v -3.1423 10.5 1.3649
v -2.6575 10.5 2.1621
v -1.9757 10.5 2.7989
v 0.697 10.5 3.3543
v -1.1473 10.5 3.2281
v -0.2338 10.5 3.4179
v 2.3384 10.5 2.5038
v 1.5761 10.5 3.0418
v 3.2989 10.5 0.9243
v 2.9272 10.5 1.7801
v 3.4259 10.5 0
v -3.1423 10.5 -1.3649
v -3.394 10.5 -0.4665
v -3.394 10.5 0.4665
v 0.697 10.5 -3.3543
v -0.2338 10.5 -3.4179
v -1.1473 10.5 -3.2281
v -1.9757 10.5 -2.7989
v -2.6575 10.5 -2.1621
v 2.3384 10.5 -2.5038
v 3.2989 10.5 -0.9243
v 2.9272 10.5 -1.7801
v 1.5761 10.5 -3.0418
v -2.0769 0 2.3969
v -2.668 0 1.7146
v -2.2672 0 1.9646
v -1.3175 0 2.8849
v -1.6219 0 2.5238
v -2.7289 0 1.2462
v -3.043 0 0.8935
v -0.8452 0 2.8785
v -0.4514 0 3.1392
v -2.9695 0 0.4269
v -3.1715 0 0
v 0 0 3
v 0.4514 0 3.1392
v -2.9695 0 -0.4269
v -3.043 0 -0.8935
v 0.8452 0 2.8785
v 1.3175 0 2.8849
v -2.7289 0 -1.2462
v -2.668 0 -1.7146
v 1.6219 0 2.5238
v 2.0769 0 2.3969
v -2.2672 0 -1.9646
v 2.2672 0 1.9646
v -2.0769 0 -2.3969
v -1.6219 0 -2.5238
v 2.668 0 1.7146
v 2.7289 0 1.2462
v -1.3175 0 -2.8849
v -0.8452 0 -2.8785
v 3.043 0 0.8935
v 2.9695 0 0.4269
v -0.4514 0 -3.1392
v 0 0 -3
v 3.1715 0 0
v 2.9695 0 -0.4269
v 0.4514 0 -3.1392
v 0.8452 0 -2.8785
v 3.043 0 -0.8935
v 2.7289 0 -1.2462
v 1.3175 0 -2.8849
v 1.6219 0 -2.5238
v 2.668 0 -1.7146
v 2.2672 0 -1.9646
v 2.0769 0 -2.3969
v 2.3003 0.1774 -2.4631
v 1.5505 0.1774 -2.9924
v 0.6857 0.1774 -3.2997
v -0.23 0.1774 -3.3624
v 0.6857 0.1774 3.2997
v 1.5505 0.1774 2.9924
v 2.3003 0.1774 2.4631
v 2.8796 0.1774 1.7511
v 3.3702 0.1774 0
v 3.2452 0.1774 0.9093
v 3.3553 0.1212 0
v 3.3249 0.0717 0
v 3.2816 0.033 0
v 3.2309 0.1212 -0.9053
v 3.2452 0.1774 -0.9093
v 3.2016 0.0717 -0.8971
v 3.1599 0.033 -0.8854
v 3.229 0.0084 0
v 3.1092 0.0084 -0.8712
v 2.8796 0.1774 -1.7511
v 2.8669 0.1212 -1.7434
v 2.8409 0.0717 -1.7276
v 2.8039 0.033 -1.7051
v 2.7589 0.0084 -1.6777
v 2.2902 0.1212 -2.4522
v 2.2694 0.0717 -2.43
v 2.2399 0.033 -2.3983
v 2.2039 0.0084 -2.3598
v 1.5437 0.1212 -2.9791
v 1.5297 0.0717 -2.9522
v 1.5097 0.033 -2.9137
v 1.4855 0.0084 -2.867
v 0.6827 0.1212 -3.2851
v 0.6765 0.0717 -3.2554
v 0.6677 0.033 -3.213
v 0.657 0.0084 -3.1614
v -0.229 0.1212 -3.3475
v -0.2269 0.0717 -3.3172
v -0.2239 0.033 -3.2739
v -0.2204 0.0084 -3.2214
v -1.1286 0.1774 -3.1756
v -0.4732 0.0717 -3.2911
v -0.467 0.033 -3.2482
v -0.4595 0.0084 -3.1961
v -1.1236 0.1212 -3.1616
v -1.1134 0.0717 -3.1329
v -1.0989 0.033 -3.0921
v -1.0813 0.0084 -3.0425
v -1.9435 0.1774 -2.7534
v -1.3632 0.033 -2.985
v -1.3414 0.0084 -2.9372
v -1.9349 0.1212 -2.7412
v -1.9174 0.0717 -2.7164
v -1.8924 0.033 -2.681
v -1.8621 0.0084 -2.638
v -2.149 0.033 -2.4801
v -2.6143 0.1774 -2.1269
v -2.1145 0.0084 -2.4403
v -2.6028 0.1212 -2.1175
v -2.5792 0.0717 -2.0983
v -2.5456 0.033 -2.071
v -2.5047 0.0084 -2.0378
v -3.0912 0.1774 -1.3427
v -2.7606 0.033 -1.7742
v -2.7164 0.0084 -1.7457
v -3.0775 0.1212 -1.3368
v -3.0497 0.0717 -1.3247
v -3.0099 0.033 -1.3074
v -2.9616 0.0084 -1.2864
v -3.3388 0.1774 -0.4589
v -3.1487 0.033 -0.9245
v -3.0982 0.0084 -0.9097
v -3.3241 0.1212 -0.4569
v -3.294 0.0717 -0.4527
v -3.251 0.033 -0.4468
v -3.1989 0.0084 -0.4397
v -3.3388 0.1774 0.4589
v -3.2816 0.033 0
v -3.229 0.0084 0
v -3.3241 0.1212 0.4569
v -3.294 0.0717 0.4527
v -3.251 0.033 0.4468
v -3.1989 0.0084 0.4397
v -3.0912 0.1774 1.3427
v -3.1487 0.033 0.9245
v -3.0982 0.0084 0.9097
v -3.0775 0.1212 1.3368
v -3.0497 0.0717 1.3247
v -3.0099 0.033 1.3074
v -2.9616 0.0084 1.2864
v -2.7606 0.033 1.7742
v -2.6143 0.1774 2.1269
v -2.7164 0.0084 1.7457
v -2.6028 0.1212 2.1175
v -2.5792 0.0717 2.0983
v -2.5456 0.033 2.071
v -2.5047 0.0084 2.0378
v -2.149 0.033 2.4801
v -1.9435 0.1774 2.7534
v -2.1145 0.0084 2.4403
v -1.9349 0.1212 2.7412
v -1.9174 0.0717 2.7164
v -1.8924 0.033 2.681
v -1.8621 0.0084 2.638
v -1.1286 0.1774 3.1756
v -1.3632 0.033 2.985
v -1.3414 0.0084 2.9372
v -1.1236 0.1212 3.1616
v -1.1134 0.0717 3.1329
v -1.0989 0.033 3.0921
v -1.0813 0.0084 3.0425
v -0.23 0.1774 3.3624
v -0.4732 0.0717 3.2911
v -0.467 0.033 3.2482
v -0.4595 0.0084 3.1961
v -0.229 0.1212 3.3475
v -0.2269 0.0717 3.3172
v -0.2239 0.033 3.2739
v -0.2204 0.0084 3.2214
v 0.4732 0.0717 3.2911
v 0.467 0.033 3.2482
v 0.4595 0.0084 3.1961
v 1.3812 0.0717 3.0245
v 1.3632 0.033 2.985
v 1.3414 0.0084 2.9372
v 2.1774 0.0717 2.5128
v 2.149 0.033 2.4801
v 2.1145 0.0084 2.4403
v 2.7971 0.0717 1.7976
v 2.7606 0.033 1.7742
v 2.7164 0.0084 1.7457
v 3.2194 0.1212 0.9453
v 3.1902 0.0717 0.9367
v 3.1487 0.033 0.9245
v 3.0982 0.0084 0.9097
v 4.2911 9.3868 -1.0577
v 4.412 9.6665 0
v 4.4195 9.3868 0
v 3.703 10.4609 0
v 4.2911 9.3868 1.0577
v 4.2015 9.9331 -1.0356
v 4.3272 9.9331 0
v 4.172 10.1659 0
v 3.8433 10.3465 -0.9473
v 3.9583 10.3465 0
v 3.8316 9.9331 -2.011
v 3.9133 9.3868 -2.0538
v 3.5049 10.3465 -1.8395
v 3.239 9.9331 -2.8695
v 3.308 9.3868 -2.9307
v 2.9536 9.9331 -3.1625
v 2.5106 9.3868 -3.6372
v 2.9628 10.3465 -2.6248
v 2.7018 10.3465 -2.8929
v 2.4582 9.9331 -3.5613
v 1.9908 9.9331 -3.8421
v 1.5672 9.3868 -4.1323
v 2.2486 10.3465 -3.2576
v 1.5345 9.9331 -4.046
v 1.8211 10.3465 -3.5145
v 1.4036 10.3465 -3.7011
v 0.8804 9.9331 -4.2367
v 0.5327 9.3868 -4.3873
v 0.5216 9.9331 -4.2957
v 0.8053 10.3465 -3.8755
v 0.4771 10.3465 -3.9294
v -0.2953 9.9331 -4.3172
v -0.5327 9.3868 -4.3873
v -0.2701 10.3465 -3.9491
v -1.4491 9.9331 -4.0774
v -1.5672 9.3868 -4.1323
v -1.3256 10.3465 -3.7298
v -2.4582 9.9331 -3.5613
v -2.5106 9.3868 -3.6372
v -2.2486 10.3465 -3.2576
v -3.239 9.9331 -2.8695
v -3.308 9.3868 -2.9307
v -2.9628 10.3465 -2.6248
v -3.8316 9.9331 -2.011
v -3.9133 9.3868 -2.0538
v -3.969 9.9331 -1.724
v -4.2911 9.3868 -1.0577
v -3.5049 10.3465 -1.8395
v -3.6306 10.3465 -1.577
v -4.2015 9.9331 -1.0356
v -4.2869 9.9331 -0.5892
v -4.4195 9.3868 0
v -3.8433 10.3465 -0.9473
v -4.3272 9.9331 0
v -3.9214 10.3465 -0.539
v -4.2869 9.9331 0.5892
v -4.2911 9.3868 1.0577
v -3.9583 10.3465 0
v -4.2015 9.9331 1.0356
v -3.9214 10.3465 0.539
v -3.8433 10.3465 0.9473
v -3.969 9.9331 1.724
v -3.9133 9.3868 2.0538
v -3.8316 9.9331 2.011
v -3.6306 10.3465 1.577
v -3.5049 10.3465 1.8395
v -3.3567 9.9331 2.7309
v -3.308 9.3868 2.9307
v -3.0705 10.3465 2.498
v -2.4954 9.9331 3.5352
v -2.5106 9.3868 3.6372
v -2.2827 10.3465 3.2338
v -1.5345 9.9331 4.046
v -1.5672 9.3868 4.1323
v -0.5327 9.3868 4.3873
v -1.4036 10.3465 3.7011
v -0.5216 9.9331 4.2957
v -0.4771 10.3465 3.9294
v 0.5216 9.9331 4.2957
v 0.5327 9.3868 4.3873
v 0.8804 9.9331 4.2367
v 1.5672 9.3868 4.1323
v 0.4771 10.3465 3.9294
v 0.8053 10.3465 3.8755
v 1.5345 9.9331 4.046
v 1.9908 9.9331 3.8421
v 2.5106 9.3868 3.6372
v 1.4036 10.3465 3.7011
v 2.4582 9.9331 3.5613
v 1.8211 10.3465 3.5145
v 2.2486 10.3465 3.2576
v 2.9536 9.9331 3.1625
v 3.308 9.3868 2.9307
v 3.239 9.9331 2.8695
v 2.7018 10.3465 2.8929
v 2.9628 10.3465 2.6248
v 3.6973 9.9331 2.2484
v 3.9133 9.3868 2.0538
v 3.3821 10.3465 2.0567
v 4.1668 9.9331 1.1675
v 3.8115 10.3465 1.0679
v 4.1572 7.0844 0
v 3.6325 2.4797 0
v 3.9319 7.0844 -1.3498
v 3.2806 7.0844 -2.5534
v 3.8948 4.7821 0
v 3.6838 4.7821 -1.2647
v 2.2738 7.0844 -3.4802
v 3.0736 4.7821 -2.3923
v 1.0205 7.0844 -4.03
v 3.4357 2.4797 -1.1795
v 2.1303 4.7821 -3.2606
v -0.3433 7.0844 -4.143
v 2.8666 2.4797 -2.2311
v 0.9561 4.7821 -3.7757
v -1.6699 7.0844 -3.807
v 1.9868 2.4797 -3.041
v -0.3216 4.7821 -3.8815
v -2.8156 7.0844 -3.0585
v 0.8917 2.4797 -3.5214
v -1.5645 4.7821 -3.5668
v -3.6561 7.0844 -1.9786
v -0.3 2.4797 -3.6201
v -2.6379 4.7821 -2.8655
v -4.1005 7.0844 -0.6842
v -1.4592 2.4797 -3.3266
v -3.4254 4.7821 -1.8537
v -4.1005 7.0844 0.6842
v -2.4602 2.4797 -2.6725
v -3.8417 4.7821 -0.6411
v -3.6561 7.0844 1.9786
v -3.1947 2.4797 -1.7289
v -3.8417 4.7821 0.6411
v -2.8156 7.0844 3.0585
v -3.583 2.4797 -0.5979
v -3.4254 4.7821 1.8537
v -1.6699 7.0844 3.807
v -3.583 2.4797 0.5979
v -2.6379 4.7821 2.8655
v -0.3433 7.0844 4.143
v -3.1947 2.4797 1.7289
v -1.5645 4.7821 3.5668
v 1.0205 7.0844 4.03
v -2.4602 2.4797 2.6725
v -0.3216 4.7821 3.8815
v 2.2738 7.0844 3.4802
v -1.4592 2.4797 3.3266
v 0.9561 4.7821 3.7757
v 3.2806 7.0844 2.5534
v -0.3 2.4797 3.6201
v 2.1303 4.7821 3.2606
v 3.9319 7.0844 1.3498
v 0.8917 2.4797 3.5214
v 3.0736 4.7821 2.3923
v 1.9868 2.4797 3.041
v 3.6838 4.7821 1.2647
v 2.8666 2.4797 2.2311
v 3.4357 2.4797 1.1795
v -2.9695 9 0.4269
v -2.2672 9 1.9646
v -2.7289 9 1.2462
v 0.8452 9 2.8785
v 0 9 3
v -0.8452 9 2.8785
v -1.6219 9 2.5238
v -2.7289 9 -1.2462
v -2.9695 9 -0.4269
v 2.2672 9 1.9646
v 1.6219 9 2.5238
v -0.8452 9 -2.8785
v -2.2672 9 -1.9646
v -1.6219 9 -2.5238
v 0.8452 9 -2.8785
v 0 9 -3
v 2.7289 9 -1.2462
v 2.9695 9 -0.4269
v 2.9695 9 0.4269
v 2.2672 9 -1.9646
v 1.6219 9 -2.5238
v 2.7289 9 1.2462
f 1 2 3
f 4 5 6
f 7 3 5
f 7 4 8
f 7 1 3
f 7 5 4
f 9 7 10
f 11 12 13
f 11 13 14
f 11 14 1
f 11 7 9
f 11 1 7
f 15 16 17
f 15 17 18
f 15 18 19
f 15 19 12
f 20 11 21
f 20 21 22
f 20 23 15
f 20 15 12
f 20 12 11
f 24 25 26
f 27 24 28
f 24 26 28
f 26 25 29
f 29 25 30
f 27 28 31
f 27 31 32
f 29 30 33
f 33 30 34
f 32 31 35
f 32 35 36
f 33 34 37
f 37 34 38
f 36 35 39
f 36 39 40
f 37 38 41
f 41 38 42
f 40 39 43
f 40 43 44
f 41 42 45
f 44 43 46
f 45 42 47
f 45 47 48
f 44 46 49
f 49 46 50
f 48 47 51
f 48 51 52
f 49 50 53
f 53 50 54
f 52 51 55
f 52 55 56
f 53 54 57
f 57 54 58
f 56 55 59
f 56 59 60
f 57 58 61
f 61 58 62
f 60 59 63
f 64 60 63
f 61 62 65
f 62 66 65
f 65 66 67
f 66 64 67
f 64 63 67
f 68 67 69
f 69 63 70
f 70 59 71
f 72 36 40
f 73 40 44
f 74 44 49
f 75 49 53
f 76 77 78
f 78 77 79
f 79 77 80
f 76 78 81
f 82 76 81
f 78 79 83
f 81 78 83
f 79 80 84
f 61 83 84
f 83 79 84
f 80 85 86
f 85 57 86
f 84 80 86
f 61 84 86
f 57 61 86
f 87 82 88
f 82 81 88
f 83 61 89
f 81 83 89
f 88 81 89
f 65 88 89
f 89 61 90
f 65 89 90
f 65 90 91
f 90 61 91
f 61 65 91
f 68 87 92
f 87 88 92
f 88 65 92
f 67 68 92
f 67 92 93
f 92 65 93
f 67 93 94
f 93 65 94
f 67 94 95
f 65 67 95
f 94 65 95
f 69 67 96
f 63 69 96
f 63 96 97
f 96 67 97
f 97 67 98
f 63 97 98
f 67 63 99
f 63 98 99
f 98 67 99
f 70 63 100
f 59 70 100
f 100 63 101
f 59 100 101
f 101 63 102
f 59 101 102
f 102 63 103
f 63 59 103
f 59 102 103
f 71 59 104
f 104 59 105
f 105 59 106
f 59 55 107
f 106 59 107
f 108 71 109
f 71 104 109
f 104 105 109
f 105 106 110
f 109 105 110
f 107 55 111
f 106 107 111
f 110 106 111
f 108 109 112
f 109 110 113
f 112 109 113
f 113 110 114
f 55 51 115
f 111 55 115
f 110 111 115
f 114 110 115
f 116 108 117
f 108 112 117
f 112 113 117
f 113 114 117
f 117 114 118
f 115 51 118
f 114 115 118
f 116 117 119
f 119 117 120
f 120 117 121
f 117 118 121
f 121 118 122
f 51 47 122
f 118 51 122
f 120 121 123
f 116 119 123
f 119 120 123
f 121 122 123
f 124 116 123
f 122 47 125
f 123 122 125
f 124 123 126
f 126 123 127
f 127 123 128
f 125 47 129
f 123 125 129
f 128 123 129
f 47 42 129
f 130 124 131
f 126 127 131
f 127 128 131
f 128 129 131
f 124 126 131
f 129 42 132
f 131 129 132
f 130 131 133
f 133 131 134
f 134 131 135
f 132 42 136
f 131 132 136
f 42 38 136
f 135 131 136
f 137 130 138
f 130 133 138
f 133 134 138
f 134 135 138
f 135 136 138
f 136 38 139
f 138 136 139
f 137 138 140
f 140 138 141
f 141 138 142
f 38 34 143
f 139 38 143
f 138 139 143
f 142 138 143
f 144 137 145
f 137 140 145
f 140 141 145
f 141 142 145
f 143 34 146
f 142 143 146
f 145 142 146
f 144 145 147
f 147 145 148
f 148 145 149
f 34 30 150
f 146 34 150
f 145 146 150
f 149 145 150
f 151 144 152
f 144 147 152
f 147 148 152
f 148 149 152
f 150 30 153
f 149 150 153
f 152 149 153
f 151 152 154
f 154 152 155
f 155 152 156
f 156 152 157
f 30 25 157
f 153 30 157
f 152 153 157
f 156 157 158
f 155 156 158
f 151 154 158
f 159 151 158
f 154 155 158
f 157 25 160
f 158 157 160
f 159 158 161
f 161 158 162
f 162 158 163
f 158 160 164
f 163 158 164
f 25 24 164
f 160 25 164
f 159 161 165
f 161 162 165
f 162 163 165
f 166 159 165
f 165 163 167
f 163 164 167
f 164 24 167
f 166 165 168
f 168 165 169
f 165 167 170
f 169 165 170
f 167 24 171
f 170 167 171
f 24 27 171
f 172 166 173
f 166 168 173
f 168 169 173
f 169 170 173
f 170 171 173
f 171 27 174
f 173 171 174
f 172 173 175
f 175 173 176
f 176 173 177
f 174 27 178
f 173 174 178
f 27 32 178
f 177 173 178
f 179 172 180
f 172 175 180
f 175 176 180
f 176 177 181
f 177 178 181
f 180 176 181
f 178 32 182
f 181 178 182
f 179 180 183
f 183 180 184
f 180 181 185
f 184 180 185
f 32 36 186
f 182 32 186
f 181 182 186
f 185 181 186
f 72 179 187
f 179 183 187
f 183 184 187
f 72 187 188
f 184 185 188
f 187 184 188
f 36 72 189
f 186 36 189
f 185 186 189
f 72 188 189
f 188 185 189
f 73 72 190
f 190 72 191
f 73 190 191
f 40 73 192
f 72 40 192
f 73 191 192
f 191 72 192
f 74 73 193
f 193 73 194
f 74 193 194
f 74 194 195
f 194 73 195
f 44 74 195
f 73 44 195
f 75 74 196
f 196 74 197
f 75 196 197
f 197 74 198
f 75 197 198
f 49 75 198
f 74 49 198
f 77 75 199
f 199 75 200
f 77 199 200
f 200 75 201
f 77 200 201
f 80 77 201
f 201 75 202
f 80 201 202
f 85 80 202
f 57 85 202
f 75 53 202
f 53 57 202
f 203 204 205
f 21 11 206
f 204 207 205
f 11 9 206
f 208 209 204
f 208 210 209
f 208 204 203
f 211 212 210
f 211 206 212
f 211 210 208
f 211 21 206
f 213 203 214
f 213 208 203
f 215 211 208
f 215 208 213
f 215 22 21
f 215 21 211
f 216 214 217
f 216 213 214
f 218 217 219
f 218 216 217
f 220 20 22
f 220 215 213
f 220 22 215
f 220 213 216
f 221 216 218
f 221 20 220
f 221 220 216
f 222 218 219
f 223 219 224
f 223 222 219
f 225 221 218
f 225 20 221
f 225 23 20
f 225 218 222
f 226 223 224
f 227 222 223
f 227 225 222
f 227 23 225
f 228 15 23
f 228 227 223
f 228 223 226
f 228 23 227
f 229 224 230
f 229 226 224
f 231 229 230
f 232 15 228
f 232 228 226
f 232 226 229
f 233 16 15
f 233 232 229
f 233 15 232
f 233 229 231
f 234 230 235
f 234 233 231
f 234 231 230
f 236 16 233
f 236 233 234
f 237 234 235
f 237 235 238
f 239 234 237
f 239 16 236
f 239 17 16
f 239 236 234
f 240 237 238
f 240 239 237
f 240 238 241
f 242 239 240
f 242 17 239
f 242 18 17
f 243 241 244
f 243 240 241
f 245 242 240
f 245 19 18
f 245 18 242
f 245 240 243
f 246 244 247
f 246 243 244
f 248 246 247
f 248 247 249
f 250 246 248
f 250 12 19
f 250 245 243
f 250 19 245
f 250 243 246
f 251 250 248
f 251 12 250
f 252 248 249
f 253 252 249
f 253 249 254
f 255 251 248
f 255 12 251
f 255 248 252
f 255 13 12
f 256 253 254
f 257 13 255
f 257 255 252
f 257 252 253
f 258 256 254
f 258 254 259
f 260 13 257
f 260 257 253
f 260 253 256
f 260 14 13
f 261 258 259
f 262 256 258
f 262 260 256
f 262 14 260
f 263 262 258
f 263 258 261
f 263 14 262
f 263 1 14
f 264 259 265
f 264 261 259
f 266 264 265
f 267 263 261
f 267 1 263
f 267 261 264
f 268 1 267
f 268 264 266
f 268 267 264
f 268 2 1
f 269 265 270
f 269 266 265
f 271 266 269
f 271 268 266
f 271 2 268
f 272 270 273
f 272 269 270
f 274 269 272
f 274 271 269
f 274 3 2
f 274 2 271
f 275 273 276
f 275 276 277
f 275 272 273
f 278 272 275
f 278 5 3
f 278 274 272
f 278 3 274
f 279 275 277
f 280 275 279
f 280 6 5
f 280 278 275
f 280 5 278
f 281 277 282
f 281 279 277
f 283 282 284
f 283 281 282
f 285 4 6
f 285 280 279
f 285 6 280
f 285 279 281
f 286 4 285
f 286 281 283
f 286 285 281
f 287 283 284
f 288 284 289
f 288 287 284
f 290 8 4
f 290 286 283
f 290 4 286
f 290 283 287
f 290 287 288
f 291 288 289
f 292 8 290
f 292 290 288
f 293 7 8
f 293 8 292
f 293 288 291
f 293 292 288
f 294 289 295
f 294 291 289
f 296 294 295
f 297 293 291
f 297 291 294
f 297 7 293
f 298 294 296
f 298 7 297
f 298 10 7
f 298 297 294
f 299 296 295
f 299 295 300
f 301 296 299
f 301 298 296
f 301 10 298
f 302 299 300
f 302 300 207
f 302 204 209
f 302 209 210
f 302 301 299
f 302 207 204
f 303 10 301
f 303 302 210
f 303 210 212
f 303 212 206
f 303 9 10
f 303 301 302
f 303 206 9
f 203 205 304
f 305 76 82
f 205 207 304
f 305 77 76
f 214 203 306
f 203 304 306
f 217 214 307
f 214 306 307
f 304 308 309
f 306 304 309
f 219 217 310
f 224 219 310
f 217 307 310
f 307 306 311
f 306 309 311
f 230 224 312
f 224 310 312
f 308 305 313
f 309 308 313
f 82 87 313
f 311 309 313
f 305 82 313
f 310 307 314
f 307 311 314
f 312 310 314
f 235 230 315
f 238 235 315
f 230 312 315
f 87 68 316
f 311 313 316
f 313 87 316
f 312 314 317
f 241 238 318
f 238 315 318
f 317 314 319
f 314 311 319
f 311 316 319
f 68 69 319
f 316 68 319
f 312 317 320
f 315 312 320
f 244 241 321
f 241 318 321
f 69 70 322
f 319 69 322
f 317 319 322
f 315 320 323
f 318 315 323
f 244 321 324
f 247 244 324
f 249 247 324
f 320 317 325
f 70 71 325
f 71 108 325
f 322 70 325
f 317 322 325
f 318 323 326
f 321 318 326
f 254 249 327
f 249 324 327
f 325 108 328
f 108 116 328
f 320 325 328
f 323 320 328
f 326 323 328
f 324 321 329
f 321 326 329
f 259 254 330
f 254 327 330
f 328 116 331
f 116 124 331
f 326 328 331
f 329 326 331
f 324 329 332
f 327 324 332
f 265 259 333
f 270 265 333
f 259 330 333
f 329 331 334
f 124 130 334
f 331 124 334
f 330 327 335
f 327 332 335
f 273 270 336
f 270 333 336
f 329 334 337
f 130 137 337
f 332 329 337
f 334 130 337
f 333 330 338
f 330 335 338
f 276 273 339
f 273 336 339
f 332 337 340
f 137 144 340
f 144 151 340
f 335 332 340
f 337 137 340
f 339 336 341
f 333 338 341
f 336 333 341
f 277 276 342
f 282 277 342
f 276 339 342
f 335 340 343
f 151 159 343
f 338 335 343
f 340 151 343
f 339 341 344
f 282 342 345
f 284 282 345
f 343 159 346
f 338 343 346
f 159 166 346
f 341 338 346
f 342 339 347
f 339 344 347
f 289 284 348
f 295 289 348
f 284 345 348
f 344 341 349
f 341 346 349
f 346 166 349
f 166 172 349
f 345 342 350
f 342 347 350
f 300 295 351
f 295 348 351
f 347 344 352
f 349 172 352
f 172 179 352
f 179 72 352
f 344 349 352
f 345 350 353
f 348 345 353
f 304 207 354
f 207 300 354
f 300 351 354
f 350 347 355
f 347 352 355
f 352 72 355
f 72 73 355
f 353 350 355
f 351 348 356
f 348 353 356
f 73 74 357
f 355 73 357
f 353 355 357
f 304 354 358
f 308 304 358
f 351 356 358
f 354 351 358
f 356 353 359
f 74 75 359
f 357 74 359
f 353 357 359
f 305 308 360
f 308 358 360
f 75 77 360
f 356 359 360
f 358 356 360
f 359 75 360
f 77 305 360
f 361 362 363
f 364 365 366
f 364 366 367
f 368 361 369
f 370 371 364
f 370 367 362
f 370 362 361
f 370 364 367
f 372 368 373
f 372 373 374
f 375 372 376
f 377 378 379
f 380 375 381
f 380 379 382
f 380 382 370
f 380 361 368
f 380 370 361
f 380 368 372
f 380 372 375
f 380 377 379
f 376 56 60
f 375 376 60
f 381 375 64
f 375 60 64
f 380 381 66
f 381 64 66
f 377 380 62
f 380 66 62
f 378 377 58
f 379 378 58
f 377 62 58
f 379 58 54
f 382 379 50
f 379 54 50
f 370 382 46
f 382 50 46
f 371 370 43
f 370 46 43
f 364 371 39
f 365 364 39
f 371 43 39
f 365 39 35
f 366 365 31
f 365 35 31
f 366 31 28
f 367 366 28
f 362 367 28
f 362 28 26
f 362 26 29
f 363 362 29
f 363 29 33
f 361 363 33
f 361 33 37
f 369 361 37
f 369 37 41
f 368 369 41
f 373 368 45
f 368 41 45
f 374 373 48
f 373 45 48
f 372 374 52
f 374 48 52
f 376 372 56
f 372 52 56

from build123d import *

# Parameters (mm, degrees)
SKETCH_1_R          = 3.35
EXTRUDE_1_DEPTH     = 10.5
EXTRUDE_1_DRAFT     = -6.5
SKETCH_2_R          = 3
CUT_EXTRUDE_1_DEPTH = 9
FILLET_1_R          = 1
FILLET_2_R          = 0.2


with BuildPart() as part:
    # Эскиз1 → Бобышка-Вытянуть1 (with draft: the straight prism first)
    with BuildSketch(Plane(origin=(0, 0, 0), x_dir=(1, 0, 0), z_dir=(0, 1, 0))):
        Circle(SKETCH_1_R)
    extrude(amount=EXTRUDE_1_DEPTH)
    # Бобышка-Вытянуть1: the draft: its side faces are tilted about the plane it starts from
    extrude_1_sides = [part.faces().sort_by_distance(p)[0] for p in [
        (-3.35, 5.25, 0),
    ]]
    draft(extrude_1_sides, Plane(origin=(0, 0, 0), x_dir=(1, 0, 0), z_dir=(0, 1, 0)), EXTRUDE_1_DRAFT)

    # Эскиз2 → Вырез-Вытянуть1 (cut)
    with BuildSketch(Plane.XZ):
        with Locations(Location((0, 0, 0), (0, 0, 270))):
            Circle(SKETCH_2_R)
    extrude(amount=-CUT_EXTRUDE_1_DEPTH, mode=Mode.SUBTRACT)

    # Скругление1
    fillet_1_edges = [part.edges().sort_by_distance(p)[0] for p in [
        (-4.546323887, 10.5, 0),
    ]]
    fillet(fillet_1_edges, radius=FILLET_1_R)

    # Скругление2
    fillet_2_edges = [part.edges().sort_by_distance(p)[0] for p in [
        (-3.35, 0, 0),
    ]]
    fillet(fillet_2_edges, radius=FILLET_2_R)


solid = part.part
